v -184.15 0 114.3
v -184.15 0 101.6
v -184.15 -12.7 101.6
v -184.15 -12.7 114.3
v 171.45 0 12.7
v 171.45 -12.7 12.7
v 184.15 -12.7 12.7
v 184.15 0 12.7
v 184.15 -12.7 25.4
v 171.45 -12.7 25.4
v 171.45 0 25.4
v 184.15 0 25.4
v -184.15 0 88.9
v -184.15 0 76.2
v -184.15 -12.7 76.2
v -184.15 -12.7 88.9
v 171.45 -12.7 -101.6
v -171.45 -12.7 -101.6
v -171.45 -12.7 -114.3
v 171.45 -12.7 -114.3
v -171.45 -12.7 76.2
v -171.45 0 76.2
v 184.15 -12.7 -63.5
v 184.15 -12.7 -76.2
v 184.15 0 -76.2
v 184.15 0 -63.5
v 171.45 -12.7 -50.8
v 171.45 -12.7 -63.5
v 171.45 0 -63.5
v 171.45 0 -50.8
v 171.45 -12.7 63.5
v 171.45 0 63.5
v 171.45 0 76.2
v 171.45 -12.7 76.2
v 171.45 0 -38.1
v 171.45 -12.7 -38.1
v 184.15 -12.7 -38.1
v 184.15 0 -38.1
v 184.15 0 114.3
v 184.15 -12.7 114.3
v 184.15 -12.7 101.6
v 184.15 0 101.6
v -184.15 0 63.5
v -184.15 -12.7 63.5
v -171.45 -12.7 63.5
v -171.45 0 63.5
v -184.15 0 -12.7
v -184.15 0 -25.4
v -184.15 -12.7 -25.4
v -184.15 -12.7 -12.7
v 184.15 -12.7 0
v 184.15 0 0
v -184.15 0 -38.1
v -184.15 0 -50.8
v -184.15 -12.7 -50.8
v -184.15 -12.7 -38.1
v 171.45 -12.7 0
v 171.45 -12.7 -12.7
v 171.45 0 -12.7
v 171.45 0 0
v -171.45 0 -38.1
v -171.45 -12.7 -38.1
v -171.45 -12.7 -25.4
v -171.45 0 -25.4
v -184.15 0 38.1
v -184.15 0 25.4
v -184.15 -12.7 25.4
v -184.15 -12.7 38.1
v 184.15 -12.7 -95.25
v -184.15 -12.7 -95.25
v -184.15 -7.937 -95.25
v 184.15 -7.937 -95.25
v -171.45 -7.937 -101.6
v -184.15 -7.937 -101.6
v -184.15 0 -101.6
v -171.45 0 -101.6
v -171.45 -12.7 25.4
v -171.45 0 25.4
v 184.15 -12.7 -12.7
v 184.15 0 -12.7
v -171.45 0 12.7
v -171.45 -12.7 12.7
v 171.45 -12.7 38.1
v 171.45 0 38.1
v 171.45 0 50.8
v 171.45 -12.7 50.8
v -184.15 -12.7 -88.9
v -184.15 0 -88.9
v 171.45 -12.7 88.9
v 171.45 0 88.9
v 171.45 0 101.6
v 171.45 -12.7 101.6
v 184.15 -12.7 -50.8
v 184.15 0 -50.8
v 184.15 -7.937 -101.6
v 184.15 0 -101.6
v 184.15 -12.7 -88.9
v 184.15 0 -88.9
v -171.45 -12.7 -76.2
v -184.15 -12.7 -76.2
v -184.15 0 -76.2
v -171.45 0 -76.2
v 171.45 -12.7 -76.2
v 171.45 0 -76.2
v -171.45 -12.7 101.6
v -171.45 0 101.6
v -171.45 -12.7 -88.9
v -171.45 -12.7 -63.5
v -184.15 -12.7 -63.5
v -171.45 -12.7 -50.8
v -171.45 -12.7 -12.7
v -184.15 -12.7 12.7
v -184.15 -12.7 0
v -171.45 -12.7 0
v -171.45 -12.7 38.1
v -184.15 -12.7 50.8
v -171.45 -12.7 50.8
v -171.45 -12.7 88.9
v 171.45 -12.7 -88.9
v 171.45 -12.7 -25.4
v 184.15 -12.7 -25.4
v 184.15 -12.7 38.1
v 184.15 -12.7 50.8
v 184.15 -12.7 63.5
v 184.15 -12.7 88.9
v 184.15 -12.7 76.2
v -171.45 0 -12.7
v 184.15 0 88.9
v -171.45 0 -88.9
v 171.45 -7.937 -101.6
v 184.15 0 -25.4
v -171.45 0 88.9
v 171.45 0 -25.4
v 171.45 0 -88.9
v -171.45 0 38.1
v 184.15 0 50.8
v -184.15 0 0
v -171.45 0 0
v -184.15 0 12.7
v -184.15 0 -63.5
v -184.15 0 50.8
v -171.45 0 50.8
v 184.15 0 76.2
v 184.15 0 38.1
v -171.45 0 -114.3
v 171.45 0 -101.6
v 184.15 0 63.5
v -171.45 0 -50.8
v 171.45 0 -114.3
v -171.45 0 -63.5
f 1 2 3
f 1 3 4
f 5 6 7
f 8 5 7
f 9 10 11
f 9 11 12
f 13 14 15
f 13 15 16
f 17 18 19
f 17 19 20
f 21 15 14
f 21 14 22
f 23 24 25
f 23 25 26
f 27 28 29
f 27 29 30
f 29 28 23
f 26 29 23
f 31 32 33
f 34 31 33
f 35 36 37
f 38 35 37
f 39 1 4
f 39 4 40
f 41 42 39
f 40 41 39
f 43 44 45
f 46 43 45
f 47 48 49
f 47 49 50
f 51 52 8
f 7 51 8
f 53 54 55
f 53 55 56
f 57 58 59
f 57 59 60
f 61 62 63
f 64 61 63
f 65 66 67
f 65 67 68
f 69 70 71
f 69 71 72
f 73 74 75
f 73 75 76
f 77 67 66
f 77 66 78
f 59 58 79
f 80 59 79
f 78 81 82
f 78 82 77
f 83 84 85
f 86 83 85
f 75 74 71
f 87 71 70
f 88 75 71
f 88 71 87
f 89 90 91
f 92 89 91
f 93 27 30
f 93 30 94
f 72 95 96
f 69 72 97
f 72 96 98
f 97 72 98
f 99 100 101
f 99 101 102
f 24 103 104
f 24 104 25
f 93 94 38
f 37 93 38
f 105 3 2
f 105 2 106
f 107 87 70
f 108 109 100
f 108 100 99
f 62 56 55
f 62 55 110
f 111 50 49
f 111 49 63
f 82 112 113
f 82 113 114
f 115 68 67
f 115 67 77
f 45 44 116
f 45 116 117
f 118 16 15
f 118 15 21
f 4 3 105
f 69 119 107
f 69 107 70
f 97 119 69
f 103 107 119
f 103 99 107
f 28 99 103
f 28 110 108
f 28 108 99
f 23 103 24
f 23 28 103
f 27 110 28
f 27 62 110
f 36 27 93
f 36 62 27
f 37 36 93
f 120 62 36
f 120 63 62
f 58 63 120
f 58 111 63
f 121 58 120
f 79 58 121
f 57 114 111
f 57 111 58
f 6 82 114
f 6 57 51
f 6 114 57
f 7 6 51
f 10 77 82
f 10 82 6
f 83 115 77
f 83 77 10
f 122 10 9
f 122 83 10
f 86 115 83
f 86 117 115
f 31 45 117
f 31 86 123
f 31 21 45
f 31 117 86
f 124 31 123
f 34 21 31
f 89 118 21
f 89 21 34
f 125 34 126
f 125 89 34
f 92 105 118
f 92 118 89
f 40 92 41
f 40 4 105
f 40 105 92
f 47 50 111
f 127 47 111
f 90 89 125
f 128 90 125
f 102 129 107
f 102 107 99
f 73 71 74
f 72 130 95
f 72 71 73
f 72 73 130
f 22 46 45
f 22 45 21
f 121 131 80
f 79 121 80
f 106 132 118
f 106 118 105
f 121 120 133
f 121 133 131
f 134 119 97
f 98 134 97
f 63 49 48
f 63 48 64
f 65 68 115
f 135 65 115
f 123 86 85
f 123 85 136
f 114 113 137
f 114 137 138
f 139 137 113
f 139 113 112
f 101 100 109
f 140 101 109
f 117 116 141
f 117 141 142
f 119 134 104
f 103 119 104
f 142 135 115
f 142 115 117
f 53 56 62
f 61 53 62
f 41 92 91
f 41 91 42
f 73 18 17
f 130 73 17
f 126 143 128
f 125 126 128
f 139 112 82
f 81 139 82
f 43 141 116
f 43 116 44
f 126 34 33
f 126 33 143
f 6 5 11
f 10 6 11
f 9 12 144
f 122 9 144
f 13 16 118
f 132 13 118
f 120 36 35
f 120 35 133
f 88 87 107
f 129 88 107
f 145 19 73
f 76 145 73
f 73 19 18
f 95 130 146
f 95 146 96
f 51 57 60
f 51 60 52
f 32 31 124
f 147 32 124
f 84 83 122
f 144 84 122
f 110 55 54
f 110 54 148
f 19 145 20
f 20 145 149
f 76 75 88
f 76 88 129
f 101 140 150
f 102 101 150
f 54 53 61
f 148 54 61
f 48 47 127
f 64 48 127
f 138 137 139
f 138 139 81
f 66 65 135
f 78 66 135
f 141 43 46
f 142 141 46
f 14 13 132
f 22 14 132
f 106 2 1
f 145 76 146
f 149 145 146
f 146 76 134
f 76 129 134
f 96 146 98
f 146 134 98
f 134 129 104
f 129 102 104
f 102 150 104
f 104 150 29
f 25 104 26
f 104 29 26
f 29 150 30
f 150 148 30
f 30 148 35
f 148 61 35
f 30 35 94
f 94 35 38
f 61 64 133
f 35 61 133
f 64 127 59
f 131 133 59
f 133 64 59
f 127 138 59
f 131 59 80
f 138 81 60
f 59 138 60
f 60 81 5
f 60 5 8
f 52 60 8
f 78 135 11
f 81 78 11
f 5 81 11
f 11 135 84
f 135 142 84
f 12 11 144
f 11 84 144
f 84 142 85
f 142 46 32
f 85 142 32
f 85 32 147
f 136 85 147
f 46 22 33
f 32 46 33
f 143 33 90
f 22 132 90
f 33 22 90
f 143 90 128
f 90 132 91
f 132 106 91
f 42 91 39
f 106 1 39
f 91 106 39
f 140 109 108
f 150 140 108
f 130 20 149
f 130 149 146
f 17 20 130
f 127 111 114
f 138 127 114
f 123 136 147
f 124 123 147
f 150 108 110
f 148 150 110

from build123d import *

# Parameters (mm, degrees)
F0_W     = 368.3
F0_H     = 228.6
F1_DEPTH = 12.7
F2_W     = 12.7
F2_H     = 12.7
F3_DEPTH = 25.4
F4_DEPTH = 25.4
F5_W     = 368.3
F5_H     = 6.35
F6_DEPTH = 4.7625


with BuildPart() as f1:
    # F0 (on Front) → F1 (new body)
    with BuildSketch(Plane.XZ):
        Rectangle(F0_W, F0_H)
    extrude(amount=F1_DEPTH)

    # F2 (on face) → F3 (cut)
    with BuildSketch(Plane.XZ.offset(12.7)):
        with Locations((-177.8, 95.25)):
            Rectangle(F2_W, F2_H)
        with Locations((-177.8, 69.85)):
            Rectangle(F2_W, F2_H)
        with Locations((-177.8, 44.45)):
            Rectangle(F2_W, F2_H)
        with Locations((-177.8, 19.05)):
            Rectangle(F2_W, F2_H)
        with Locations((-177.8, -6.35)):
            Rectangle(F2_W, F2_H)
        with Locations((-177.8, -31.75)):
            Rectangle(F2_W, F2_H)
        with Locations((-177.8, -57.15)):
            Rectangle(F2_W, F2_H)
        with Locations((-177.8, -82.55)):
            Rectangle(F2_W, F2_H)
        with Locations((-177.8, -107.95)):
            Rectangle(F2_W, F2_H)
        with Locations((177.8, 69.85)):
            Rectangle(F2_W, F2_H)
        with Locations((177.8, 95.25)):
            Rectangle(F2_W, F2_H)
        with Locations((177.8, -82.55)):
            Rectangle(F2_W, F2_H)
        with Locations((177.8, -107.95)):
            Rectangle(F2_W, F2_H)
        with Locations((177.8, -57.15)):
            Rectangle(F2_W, F2_H)
        with Locations((177.8, -6.35)):
            Rectangle(F2_W, F2_H)
        with Locations((177.8, 19.05)):
            Rectangle(F2_W, F2_H)
        with Locations((177.8, 44.45)):
            Rectangle(F2_W, F2_H)
        with Locations((177.8, -31.75)):
            Rectangle(F2_W, F2_H)
    extrude(amount=-F3_DEPTH, mode=Mode.SUBTRACT)

    # F2 (on face) → F4 (cut)
    with BuildSketch(Plane.XZ.offset(12.7)):
        with Locations((-177.8, 95.25)):
            Rectangle(F2_W, F2_H)
        with Locations((-177.8, 69.85)):
            Rectangle(F2_W, F2_H)
        with Locations((-177.8, 44.45)):
            Rectangle(F2_W, F2_H)
        with Locations((-177.8, 19.05)):
            Rectangle(F2_W, F2_H)
        with Locations((-177.8, -6.35)):
            Rectangle(F2_W, F2_H)
        with Locations((-177.8, -31.75)):
            Rectangle(F2_W, F2_H)
        with Locations((-177.8, -57.15)):
            Rectangle(F2_W, F2_H)
        with Locations((-177.8, -82.55)):
            Rectangle(F2_W, F2_H)
        with Locations((-177.8, -107.95)):
            Rectangle(F2_W, F2_H)
        with Locations((177.8, 69.85)):
            Rectangle(F2_W, F2_H)
        with Locations((177.8, 95.25)):
            Rectangle(F2_W, F2_H)
        with Locations((177.8, -82.55)):
            Rectangle(F2_W, F2_H)
        with Locations((177.8, -107.95)):
            Rectangle(F2_W, F2_H)
        with Locations((177.8, -57.15)):
            Rectangle(F2_W, F2_H)
        with Locations((177.8, -6.35)):
            Rectangle(F2_W, F2_H)
        with Locations((177.8, 19.05)):
            Rectangle(F2_W, F2_H)
        with Locations((177.8, 44.45)):
            Rectangle(F2_W, F2_H)
        with Locations((177.8, -31.75)):
            Rectangle(F2_W, F2_H)
    extrude(amount=-F4_DEPTH, mode=Mode.SUBTRACT)

    # F5 (on face) → F6 (cut)
    with BuildSketch(Plane.XZ.offset(12.7)):
        with Locations((0, -98.425)):
            Rectangle(F5_W, F5_H)
    extrude(amount=-F6_DEPTH, mode=Mode.SUBTRACT)


solid = f1.part
